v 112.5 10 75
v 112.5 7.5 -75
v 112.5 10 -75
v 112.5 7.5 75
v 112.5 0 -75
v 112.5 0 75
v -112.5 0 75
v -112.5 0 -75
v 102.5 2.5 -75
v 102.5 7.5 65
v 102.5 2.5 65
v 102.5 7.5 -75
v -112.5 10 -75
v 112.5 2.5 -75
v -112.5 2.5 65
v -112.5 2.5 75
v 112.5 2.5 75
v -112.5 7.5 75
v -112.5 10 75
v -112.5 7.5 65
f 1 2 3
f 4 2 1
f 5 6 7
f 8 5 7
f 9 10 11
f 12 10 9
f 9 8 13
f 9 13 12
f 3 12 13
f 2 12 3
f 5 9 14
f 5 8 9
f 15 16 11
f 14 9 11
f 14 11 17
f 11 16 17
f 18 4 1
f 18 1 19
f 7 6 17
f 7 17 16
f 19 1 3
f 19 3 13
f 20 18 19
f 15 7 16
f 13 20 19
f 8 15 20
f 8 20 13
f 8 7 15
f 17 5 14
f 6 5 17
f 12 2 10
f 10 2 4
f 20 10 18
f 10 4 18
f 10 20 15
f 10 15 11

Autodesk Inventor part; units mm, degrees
ref_plane "YZ Plane" through (0, 0, 0) normal (1, 0, 0) x (0, 1, 0)
ref_plane "XZ Plane" through (0, 0, 0) normal (0, 1, 0) x (-1, 0, 0)
ref_plane "XY Plane" through (0, 0, 0) normal (0, 0, 1) x (1, 0, 0)
sketch "Sketch1" plane through (0, 0, 0) normal (0, 1, 0) x (-1, 0, 0)
  line L0 (-112.5, 75) -> (112.5, 75)
  line L1 (112.5, 75) -> (112.5, -75)
  line L2 (112.5, -75) -> (-112.5, -75)
  line L3 (-112.5, -75) -> (-112.5, 75)
  line L4 (-112.5, 75) -> (112.5, -75) construction
  line L5 (112.5, 75) -> (-112.5, -75) construction
  point P0 (0, 0)
  dimension "d0" = 225
  dimension "d1" = 150
extrude "Extrusion1" add sketch "Sketch1" along normal blind 10
sketch "Sketch4" plane through (112.5, 0, 75) normal (1, 0, 0) x (0, 0, -1)
  line L0 (0, 2.5) -> (150, 2.5)
  line L1 (150, 2.5) -> (150, 7.5)
  line L2 (150, 7.5) -> (0, 7.5)
  line L3 (0, 7.5) -> (0, 2.5)
  point P0 (75, 0)
  dimension "d12" = 150
  dimension "d13" = 5
extrude "Extrusion4" cut sketch "Sketch4" against normal blind 10
sketch "Sketch5" plane through (-112.5, 0, 75) normal (0, 0, 1) x (1, 0, 0)
  line L0 (0, 0) -> (0, 10) projected
  line L1 (0, 2.5) -> (225, 2.5)
  line L2 (225, 2.5) -> (225, 7.5)
  line L3 (225, 7.5) -> (0, 7.5)
  line L4 (0, 7.5) -> (0, 2.5)
  point P0 (112.5, 0)
  dimension "d16" = 225
  dimension "d17" = 5
extrude "Extrusion5" cut sketch "Sketch5" against normal blind 10
properties part number "TSU_Baseplate_Female"
